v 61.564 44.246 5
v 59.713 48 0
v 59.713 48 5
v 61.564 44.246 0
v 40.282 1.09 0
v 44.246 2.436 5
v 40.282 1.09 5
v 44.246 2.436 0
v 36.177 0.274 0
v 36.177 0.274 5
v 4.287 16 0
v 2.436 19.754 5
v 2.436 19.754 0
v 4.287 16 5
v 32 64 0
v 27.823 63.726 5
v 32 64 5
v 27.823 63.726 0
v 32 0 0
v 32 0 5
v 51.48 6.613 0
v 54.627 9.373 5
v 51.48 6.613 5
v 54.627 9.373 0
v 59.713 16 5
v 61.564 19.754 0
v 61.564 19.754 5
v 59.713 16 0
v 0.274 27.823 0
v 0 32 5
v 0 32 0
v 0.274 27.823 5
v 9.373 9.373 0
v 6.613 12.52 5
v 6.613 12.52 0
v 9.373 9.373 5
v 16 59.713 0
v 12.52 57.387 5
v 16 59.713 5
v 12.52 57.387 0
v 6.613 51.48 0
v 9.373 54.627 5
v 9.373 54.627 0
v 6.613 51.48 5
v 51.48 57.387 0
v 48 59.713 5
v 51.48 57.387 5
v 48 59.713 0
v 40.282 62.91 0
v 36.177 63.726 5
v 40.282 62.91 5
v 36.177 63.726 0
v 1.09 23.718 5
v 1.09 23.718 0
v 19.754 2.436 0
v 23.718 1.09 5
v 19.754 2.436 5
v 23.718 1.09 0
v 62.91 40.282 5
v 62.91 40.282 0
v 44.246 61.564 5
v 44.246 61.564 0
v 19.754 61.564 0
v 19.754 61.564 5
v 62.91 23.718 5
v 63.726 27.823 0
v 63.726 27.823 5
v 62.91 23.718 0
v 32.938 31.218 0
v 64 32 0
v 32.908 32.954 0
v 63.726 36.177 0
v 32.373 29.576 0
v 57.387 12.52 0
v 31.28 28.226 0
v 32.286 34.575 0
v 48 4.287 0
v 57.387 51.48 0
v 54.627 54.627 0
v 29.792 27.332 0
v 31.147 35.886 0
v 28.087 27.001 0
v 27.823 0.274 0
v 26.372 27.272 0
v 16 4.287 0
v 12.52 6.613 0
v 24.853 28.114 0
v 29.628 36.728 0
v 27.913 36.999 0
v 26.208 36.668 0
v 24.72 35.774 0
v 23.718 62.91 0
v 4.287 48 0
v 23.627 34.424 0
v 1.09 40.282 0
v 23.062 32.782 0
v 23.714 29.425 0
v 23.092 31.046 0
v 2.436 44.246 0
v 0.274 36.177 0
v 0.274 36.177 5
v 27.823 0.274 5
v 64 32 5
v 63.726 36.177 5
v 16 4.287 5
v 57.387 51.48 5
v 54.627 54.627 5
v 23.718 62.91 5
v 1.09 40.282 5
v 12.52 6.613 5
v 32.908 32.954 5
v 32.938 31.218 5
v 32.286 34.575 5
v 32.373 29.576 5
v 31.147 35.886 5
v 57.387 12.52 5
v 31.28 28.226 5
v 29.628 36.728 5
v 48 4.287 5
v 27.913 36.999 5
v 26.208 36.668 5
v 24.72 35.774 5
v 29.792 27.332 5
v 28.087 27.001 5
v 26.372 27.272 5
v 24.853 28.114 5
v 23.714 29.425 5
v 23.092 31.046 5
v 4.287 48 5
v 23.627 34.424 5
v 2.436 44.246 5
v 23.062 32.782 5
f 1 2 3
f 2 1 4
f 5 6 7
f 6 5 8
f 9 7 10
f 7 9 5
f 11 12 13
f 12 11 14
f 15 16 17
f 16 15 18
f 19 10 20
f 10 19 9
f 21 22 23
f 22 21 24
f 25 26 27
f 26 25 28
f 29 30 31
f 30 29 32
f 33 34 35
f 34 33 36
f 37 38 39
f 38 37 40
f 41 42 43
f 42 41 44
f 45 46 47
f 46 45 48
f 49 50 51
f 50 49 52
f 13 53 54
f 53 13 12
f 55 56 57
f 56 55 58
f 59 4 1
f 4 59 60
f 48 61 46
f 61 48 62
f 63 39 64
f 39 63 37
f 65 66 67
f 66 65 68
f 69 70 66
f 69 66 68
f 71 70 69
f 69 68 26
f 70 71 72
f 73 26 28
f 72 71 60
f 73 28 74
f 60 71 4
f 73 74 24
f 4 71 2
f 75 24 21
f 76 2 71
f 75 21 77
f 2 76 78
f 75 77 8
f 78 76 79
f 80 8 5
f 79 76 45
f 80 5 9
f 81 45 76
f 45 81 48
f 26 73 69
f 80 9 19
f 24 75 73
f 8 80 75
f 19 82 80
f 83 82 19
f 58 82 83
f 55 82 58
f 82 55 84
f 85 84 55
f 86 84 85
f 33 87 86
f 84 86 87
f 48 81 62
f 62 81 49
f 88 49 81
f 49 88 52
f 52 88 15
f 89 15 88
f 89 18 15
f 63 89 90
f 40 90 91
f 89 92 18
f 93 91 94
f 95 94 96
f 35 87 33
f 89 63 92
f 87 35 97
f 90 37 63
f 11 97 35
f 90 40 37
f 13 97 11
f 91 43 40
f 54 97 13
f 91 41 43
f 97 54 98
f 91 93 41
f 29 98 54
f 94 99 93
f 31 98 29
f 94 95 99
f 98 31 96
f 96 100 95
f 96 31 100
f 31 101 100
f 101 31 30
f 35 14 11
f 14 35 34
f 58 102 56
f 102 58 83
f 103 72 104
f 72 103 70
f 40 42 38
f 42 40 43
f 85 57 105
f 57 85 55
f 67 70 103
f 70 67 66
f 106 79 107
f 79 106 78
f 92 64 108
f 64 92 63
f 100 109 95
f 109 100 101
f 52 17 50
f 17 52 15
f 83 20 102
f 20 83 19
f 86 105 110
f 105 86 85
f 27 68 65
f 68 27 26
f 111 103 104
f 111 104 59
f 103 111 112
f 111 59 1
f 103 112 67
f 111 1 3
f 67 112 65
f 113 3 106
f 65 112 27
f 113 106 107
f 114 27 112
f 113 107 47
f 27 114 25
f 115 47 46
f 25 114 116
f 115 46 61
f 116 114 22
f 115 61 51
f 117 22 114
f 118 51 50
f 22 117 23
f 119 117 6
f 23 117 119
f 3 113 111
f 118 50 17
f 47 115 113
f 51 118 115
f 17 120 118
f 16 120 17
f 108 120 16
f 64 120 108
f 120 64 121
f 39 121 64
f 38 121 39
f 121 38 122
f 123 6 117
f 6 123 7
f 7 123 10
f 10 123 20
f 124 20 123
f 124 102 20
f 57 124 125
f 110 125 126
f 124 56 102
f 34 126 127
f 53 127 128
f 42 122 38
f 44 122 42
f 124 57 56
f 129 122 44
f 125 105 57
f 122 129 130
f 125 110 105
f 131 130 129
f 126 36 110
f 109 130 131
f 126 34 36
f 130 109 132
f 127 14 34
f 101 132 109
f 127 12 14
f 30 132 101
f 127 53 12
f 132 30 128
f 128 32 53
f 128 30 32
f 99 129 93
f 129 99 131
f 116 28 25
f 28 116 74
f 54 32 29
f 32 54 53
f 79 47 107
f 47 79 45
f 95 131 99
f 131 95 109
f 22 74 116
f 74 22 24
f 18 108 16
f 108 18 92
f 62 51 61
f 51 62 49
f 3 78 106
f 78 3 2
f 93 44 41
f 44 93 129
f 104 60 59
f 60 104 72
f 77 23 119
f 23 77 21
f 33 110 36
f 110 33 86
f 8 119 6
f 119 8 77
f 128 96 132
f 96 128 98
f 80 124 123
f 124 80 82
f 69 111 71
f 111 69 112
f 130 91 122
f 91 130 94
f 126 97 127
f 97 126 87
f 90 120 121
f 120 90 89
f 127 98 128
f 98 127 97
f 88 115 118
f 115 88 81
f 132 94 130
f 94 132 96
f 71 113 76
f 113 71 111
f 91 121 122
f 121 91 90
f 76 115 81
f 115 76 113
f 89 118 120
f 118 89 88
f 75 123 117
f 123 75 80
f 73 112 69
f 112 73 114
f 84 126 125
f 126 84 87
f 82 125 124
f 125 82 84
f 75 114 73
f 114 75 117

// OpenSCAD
$fn = 32;

// ----------------------------------------------------------------------
// Cam plate: eccentric cam, base R32
// ----------------------------------------------------------------------

// --- parameters (mm) ---
base_r = 32;              // base circle radius
lobe_h = 8;               // cam lobe rise
bore_r = 5;               // shaft bore radius
plate_t = 5;              // plate thickness, Z (extrusion height)
ecc = 4;                  // disc eccentricity

profile = [[64, 32], [63.726, 36.177], [62.91, 40.282], [61.564, 44.246], [59.713, 48], [57.387, 51.48], [54.627, 54.627], [51.48, 57.387], [48, 59.713], [44.246, 61.564], [40.282, 62.91], [36.177, 63.726], [32, 64], [27.823, 63.726], [23.718, 62.91], [19.754, 61.564], [16, 59.713], [12.52, 57.387], [9.373, 54.627], [6.613, 51.48], [4.287, 48], [2.436, 44.246], [1.09, 40.282], [0.274, 36.177], [0, 32], [0.274, 27.823], [1.09, 23.718], [2.436, 19.754], [4.287, 16], [6.613, 12.52], [9.373, 9.373], [12.52, 6.613], [16, 4.287], [19.754, 2.436], [23.718, 1.09], [27.823, 0.274], [32, 0], [36.177, 0.274], [40.282, 1.09], [44.246, 2.436], [48, 4.287], [51.48, 6.613], [54.627, 9.373], [57.387, 12.52], [59.713, 16], [61.564, 19.754], [62.91, 23.718], [63.726, 27.823]];  // primary outline, 48 points, counter clockwise
void_1 = [[32.908, 32.954], [32.286, 34.575], [31.147, 35.886], [29.628, 36.728], [27.913, 36.999], [26.208, 36.668], [24.72, 35.774], [23.627, 34.424], [23.062, 32.782], [23.092, 31.046], [23.714, 29.425], [24.853, 28.114], [26.372, 27.272], [28.087, 27.001], [29.792, 27.332], [31.28, 28.226], [32.373, 29.576], [32.938, 31.218]];  // shaft bore, 18 points

// --- the one profile operation ---
difference() {
  linear_extrude(height = plate_t) polygon(points = profile);
  translate([0, 0, -1])
    linear_extrude(height = plate_t + 2) polygon(points = void_1);
}
